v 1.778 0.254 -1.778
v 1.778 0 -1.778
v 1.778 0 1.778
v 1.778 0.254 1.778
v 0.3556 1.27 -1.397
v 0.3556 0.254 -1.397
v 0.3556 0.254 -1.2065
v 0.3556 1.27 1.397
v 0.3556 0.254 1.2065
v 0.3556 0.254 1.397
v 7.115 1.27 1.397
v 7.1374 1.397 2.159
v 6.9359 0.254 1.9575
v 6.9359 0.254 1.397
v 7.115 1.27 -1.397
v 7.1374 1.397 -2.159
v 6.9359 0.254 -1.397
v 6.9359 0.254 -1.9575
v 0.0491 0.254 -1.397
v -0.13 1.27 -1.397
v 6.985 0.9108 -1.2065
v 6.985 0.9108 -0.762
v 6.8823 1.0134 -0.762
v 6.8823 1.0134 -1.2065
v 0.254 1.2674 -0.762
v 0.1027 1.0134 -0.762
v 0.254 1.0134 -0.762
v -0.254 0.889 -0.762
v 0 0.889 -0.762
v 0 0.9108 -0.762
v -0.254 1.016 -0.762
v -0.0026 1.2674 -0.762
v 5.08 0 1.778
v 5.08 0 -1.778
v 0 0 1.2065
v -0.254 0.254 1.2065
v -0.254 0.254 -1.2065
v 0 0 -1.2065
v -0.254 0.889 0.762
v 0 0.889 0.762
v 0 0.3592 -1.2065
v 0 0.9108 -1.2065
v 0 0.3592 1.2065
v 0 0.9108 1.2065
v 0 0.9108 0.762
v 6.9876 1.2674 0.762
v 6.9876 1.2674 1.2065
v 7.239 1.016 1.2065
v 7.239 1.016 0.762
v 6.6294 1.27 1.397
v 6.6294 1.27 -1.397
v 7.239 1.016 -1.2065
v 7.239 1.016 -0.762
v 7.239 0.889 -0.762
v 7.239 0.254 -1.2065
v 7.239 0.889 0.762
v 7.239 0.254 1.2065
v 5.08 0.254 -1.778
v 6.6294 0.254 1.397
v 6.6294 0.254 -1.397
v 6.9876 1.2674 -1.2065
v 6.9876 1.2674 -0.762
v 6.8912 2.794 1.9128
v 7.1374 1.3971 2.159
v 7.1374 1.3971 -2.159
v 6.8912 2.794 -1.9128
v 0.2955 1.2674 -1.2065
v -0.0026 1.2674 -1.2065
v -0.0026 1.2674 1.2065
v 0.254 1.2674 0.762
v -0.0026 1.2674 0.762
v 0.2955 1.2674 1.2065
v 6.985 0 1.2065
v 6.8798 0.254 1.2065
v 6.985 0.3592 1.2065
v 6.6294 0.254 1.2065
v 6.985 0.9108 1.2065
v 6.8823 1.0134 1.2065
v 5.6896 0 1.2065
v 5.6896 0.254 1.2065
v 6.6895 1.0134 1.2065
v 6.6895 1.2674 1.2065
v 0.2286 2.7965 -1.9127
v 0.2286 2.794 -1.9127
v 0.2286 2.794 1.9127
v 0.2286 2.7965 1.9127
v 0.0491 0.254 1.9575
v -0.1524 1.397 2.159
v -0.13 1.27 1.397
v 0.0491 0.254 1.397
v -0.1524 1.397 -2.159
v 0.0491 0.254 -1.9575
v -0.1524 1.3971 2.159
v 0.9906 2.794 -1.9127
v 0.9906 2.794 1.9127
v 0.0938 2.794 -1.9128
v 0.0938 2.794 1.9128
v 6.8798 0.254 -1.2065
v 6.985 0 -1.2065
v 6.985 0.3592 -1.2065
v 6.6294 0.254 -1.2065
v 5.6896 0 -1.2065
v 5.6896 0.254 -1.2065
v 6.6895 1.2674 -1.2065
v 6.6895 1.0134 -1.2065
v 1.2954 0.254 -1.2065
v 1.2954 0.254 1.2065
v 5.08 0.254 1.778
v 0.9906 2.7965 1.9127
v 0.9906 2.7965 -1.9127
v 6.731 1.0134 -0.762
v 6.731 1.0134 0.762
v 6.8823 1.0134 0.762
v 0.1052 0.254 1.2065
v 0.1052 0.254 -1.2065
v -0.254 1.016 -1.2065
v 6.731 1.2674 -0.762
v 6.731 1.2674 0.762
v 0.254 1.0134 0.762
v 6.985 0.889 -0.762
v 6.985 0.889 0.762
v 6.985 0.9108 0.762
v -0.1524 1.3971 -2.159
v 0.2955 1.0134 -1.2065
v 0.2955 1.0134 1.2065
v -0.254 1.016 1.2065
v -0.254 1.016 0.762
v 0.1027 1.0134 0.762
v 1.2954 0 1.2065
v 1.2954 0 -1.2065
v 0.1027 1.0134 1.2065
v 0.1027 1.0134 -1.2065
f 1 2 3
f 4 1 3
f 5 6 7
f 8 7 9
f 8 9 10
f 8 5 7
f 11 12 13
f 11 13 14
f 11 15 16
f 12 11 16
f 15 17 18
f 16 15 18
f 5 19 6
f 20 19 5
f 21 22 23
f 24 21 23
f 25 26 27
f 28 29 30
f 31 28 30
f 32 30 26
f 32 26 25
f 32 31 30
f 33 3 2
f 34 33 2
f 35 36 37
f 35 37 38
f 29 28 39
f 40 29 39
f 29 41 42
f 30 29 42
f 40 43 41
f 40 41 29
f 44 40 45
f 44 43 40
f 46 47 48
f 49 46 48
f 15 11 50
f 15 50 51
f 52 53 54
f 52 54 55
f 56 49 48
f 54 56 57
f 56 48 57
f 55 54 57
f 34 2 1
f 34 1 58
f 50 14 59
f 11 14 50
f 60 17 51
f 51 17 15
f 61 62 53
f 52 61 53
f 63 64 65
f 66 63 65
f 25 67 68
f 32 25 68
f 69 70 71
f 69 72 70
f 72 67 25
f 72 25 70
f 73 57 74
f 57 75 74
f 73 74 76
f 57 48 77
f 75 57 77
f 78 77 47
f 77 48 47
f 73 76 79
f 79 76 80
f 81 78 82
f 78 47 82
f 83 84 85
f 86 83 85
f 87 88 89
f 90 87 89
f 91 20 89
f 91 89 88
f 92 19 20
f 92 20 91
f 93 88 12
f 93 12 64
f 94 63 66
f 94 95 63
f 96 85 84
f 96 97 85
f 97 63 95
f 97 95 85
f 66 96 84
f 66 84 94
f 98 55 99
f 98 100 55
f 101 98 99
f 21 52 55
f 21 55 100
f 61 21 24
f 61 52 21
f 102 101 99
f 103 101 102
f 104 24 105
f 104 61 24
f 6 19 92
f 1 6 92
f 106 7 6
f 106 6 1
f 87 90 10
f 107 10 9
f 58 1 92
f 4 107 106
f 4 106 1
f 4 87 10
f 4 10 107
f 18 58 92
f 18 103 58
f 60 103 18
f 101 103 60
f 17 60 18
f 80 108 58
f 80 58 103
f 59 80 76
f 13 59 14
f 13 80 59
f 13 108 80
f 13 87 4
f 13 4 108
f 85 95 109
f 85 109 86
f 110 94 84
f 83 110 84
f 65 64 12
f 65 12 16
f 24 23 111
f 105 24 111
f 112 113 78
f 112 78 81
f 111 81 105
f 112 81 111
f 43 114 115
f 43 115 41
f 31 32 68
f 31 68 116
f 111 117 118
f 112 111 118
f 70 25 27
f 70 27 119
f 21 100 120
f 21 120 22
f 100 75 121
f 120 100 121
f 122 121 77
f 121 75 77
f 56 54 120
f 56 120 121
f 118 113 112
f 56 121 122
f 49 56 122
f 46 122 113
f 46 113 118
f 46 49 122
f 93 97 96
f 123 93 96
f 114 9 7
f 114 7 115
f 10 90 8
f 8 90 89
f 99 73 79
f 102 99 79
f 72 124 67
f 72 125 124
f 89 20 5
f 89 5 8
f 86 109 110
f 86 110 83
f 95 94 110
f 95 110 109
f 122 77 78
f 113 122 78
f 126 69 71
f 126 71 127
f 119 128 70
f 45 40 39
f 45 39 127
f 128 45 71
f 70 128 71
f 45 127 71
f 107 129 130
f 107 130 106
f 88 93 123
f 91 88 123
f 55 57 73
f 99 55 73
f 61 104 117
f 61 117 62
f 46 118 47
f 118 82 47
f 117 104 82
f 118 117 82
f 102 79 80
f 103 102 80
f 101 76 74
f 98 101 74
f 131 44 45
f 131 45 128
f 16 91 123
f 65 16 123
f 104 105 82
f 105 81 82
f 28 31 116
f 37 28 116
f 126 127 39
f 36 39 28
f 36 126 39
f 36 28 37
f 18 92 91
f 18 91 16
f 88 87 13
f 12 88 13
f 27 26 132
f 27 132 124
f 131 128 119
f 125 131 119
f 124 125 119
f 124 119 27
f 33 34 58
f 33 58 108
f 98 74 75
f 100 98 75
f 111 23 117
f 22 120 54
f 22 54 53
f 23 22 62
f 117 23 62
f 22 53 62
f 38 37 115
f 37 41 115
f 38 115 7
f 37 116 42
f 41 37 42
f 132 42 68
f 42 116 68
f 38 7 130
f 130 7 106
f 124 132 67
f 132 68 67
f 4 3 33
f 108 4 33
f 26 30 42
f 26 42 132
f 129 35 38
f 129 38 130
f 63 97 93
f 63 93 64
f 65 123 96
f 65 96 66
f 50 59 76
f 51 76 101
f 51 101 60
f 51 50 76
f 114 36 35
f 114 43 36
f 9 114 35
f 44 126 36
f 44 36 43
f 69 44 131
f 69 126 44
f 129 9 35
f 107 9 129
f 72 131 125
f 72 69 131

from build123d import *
from OCP.BRepFilletAPI import BRepFilletAPI_MakeChamfer

# Parameters (mm, degrees)
SKETCH2_W                = 4.318
SKETCH2_H                = 2.794
BASE_EXTRUDE_DEPTH       = 7.2898
CHAMFER1_SIZE            = 1.397
CHAMFER1_SIZE2           = 0.246328792
SKETCH3_W                = 2.794
SKETCH3_H                = 1.27
CUT_EXTRUDE1_DEPTH       = 0.508
SKETCH4_W                = 2.794
SKETCH4_H                = 1.27
CUT_EXTRUDE2_DEPTH       = 0.508
SKETCH5_OUTSIDE_W        = 11.073
SKETCH5_OUTSIDE_H        = 8.102
SKETCH5_OUTSIDE_W_2      = 3.302
SKETCH5_OUTSIDE_H_2      = 3.556
CUT_EXTRUDE3_DEPTH       = 0.254
CHAMFER2_SIZE            = 1.397
CHAMFER2_SIZE_2          = 0.246328792
BOSS_EXTRUDE_THIN1_DEPTH = 1.2065
SKETCH7_W                = 1.524
SKETCH7_H                = 0.381
CUT_EXTRUDE4_DEPTH       = 0.508
SKETCH8_W                = 0.762
SKETCH8_H                = 3.825342416
BOSS_EXTRUDE2_DEPTH      = 0.00254


with BuildPart() as part:
    # Sketch2 → Base-Extrude (new body)
    with BuildSketch(Plane(origin=(-0.1524, 0, 0), x_dir=(0, 0, -1), z_dir=(1, 0, 0))):
        with Locations((0, 1.397)):
            Rectangle(SKETCH2_W, SKETCH2_H)
    extrude(amount=BASE_EXTRUDE_DEPTH)

    # Chamfer1: one chamfer whose edges measure the first distance from different faces: ONE call of the kernel's chamfer builder (chamfer() names one face for all edges)
    chamfer1_edges_1 = [part.edges().sort_by_distance(p)[0] for p in [
        (7.1374, 0, 0),
    ]]
    chamfer1_side_1 = [part.faces().sort_by_distance(p)[0] for p in [
        (7.1374, 1.397, 0),
    ]]
    chamfer1_edges_2 = [part.edges().sort_by_distance(p)[0] for p in [
        (-0.1524, 0, 0),
    ]]
    chamfer1_side_2 = [part.faces().sort_by_distance(p)[0] for p in [
        (-0.1524, 1.397, 0),
    ]]
    chamfer1_edges_3 = [part.edges().sort_by_distance(p)[0] for p in [
        (3.4925, 0, -2.159),
    ]]
    chamfer1_side_3 = [part.faces().sort_by_distance(p)[0] for p in [
        (3.4925, 1.397, -2.159),
    ]]
    chamfer1_edges_4 = [part.edges().sort_by_distance(p)[0] for p in [
        (3.4925, 0, 2.159),
    ]]
    chamfer1_side_4 = [part.faces().sort_by_distance(p)[0] for p in [
        (3.4925, 1.397, 2.159),
    ]]
    chamfer1 = BRepFilletAPI_MakeChamfer(part.part.solid().wrapped)
    for e in chamfer1_edges_1:
        chamfer1.Add(CHAMFER1_SIZE, CHAMFER1_SIZE2, e.wrapped, chamfer1_side_1[0].wrapped)  # the first distance lies on this face
    for e in chamfer1_edges_2:
        chamfer1.Add(CHAMFER1_SIZE, CHAMFER1_SIZE2, e.wrapped, chamfer1_side_2[0].wrapped)  # the first distance lies on this face
    for e in chamfer1_edges_3:
        chamfer1.Add(CHAMFER1_SIZE, CHAMFER1_SIZE2, e.wrapped, chamfer1_side_3[0].wrapped)  # the first distance lies on this face
    for e in chamfer1_edges_4:
        chamfer1.Add(CHAMFER1_SIZE, CHAMFER1_SIZE2, e.wrapped, chamfer1_side_4[0].wrapped)  # the first distance lies on this face
    add(Compound.cast(chamfer1.Shape()), mode=Mode.REPLACE)

    # Sketch3 → Cut-Extrude1 (cut)
    with BuildSketch(Plane.ZY.offset(0.1524)):
        with Locations((0, 0.635)):
            Rectangle(SKETCH3_W, SKETCH3_H)
    extrude(amount=-CUT_EXTRUDE1_DEPTH, mode=Mode.SUBTRACT)

    # Sketch4 → Cut-Extrude2 (cut)
    with BuildSketch(Plane(origin=(7.1374, 0, 0), x_dir=(0, 0, -1), z_dir=(1, 0, 0))):
        with Locations((0, 0.635)):
            Rectangle(SKETCH4_W, SKETCH4_H)
    extrude(amount=-CUT_EXTRUDE2_DEPTH, mode=Mode.SUBTRACT)

    # Sketch5 outside → Cut-Extrude3 (cut)
    with BuildSketch(Plane.XZ):
        with Locations((3.4925, 0)):
            Rectangle(SKETCH5_OUTSIDE_W, SKETCH5_OUTSIDE_H)
        with Locations((3.429, 0)):
            Rectangle(SKETCH5_OUTSIDE_W_2, SKETCH5_OUTSIDE_H_2, mode=Mode.SUBTRACT)
    extrude(amount=-CUT_EXTRUDE3_DEPTH, mode=Mode.SUBTRACT)

    # Chamfer2
    chamfer2_edges_1 = [part.edges().sort_by_distance(p)[0] for p in [
        (-0.1524, 2.794, 0),
    ]]
    chamfer2_side_1 = [part.faces().sort_by_distance(p)[0] for p in [
        (-0.1524, 2.789073424, 0),
    ]]
    chamfer2_edges_2 = [part.edges().sort_by_distance(p)[0] for p in [
        (7.1374, 2.794, 0),
    ]]
    chamfer2_side_2 = [part.faces().sort_by_distance(p)[0] for p in [
        (7.132473424, 2.794, 0),
    ]]
    chamfer2_edges_3 = [part.edges().sort_by_distance(p)[0] for p in [
        (3.4925, 2.794, 2.159),
    ]]
    chamfer2_side_3 = [part.faces().sort_by_distance(p)[0] for p in [
        (3.4925, 2.789073424, 2.159),
    ]]
    chamfer2_edges_4 = [part.edges().sort_by_distance(p)[0] for p in [
        (3.4925, 2.794, -2.159),
    ]]
    chamfer2_side_4 = [part.faces().sort_by_distance(p)[0] for p in [
        (3.4925, 2.794, -2.154073424),
    ]]
    chamfer2 = BRepFilletAPI_MakeChamfer(part.part.solid().wrapped)
    for e in chamfer2_edges_1:
        chamfer2.Add(CHAMFER2_SIZE - 0.0001, CHAMFER2_SIZE_2 - 0.0001, e.wrapped, chamfer2_side_1[0].wrapped)
    for e in chamfer2_edges_2:
        chamfer2.Add(CHAMFER2_SIZE_2 - 0.0001, CHAMFER2_SIZE - 0.0001, e.wrapped, chamfer2_side_2[0].wrapped)
    for e in chamfer2_edges_3:
        chamfer2.Add(CHAMFER2_SIZE - 0.0001, CHAMFER2_SIZE_2 - 0.0001, e.wrapped, chamfer2_side_3[0].wrapped)
    for e in chamfer2_edges_4:
        chamfer2.Add(CHAMFER2_SIZE_2 - 0.0001, CHAMFER2_SIZE - 0.0001, e.wrapped, chamfer2_side_4[0].wrapped)
    add(Compound.cast(chamfer2.Shape()), mode=Mode.REPLACE)  # a hair under: the kernel refuses the full size

    # Sketch6 → Boss-Extrude-Thin1 (add, symmetric)
    with BuildSketch(Plane.XY):
        Polygon((0.295515086, 1.267447171), (-0.002552829, 1.267447171), (-0.254, 1.016), (-0.254, 0.254), (0, 0), (1.2954, 0), (1.2954, 0.254), (0.105210245, 0.254), (0, 0.359210245), (0, 0.910789755), (0.102657416, 1.013447171), (0.295515086, 1.013447171), align=None)
    boss_extrude_thin1 = extrude(amount=BOSS_EXTRUDE_THIN1_DEPTH, both=True)

    # Sketch7 → Cut-Extrude4 (cut)
    with BuildSketch(Plane.ZY.offset(0.254)):
        with Locations((0, 1.0795)):
            Rectangle(SKETCH7_W, SKETCH7_H)
    cut_extrude4 = extrude(amount=-CUT_EXTRUDE4_DEPTH, mode=Mode.SUBTRACT)

    # Mirror1: Boss-Extrude-Thin1, Cut-Extrude4 across plane
    add(boss_extrude_thin1.mirror(Plane(origin=(3.4925, 0, 0), x_dir=(0, 0, 1), z_dir=(1, 0, 0))))
    add(cut_extrude4.mirror(Plane(origin=(3.4925, 0, 0), x_dir=(0, 0, 1), z_dir=(1, 0, 0))), mode=Mode.SUBTRACT)

    # Sketch8 → Boss-Extrude2 (add)
    with BuildSketch(Plane(origin=(0, 2.794, 0), x_dir=(-1, 0, 0), z_dir=(0, 1, 0))):
        with Locations((-0.6096, 0)):
            Rectangle(SKETCH8_W, SKETCH8_H)
    extrude(amount=BOSS_EXTRUDE2_DEPTH)


solid = part.part
